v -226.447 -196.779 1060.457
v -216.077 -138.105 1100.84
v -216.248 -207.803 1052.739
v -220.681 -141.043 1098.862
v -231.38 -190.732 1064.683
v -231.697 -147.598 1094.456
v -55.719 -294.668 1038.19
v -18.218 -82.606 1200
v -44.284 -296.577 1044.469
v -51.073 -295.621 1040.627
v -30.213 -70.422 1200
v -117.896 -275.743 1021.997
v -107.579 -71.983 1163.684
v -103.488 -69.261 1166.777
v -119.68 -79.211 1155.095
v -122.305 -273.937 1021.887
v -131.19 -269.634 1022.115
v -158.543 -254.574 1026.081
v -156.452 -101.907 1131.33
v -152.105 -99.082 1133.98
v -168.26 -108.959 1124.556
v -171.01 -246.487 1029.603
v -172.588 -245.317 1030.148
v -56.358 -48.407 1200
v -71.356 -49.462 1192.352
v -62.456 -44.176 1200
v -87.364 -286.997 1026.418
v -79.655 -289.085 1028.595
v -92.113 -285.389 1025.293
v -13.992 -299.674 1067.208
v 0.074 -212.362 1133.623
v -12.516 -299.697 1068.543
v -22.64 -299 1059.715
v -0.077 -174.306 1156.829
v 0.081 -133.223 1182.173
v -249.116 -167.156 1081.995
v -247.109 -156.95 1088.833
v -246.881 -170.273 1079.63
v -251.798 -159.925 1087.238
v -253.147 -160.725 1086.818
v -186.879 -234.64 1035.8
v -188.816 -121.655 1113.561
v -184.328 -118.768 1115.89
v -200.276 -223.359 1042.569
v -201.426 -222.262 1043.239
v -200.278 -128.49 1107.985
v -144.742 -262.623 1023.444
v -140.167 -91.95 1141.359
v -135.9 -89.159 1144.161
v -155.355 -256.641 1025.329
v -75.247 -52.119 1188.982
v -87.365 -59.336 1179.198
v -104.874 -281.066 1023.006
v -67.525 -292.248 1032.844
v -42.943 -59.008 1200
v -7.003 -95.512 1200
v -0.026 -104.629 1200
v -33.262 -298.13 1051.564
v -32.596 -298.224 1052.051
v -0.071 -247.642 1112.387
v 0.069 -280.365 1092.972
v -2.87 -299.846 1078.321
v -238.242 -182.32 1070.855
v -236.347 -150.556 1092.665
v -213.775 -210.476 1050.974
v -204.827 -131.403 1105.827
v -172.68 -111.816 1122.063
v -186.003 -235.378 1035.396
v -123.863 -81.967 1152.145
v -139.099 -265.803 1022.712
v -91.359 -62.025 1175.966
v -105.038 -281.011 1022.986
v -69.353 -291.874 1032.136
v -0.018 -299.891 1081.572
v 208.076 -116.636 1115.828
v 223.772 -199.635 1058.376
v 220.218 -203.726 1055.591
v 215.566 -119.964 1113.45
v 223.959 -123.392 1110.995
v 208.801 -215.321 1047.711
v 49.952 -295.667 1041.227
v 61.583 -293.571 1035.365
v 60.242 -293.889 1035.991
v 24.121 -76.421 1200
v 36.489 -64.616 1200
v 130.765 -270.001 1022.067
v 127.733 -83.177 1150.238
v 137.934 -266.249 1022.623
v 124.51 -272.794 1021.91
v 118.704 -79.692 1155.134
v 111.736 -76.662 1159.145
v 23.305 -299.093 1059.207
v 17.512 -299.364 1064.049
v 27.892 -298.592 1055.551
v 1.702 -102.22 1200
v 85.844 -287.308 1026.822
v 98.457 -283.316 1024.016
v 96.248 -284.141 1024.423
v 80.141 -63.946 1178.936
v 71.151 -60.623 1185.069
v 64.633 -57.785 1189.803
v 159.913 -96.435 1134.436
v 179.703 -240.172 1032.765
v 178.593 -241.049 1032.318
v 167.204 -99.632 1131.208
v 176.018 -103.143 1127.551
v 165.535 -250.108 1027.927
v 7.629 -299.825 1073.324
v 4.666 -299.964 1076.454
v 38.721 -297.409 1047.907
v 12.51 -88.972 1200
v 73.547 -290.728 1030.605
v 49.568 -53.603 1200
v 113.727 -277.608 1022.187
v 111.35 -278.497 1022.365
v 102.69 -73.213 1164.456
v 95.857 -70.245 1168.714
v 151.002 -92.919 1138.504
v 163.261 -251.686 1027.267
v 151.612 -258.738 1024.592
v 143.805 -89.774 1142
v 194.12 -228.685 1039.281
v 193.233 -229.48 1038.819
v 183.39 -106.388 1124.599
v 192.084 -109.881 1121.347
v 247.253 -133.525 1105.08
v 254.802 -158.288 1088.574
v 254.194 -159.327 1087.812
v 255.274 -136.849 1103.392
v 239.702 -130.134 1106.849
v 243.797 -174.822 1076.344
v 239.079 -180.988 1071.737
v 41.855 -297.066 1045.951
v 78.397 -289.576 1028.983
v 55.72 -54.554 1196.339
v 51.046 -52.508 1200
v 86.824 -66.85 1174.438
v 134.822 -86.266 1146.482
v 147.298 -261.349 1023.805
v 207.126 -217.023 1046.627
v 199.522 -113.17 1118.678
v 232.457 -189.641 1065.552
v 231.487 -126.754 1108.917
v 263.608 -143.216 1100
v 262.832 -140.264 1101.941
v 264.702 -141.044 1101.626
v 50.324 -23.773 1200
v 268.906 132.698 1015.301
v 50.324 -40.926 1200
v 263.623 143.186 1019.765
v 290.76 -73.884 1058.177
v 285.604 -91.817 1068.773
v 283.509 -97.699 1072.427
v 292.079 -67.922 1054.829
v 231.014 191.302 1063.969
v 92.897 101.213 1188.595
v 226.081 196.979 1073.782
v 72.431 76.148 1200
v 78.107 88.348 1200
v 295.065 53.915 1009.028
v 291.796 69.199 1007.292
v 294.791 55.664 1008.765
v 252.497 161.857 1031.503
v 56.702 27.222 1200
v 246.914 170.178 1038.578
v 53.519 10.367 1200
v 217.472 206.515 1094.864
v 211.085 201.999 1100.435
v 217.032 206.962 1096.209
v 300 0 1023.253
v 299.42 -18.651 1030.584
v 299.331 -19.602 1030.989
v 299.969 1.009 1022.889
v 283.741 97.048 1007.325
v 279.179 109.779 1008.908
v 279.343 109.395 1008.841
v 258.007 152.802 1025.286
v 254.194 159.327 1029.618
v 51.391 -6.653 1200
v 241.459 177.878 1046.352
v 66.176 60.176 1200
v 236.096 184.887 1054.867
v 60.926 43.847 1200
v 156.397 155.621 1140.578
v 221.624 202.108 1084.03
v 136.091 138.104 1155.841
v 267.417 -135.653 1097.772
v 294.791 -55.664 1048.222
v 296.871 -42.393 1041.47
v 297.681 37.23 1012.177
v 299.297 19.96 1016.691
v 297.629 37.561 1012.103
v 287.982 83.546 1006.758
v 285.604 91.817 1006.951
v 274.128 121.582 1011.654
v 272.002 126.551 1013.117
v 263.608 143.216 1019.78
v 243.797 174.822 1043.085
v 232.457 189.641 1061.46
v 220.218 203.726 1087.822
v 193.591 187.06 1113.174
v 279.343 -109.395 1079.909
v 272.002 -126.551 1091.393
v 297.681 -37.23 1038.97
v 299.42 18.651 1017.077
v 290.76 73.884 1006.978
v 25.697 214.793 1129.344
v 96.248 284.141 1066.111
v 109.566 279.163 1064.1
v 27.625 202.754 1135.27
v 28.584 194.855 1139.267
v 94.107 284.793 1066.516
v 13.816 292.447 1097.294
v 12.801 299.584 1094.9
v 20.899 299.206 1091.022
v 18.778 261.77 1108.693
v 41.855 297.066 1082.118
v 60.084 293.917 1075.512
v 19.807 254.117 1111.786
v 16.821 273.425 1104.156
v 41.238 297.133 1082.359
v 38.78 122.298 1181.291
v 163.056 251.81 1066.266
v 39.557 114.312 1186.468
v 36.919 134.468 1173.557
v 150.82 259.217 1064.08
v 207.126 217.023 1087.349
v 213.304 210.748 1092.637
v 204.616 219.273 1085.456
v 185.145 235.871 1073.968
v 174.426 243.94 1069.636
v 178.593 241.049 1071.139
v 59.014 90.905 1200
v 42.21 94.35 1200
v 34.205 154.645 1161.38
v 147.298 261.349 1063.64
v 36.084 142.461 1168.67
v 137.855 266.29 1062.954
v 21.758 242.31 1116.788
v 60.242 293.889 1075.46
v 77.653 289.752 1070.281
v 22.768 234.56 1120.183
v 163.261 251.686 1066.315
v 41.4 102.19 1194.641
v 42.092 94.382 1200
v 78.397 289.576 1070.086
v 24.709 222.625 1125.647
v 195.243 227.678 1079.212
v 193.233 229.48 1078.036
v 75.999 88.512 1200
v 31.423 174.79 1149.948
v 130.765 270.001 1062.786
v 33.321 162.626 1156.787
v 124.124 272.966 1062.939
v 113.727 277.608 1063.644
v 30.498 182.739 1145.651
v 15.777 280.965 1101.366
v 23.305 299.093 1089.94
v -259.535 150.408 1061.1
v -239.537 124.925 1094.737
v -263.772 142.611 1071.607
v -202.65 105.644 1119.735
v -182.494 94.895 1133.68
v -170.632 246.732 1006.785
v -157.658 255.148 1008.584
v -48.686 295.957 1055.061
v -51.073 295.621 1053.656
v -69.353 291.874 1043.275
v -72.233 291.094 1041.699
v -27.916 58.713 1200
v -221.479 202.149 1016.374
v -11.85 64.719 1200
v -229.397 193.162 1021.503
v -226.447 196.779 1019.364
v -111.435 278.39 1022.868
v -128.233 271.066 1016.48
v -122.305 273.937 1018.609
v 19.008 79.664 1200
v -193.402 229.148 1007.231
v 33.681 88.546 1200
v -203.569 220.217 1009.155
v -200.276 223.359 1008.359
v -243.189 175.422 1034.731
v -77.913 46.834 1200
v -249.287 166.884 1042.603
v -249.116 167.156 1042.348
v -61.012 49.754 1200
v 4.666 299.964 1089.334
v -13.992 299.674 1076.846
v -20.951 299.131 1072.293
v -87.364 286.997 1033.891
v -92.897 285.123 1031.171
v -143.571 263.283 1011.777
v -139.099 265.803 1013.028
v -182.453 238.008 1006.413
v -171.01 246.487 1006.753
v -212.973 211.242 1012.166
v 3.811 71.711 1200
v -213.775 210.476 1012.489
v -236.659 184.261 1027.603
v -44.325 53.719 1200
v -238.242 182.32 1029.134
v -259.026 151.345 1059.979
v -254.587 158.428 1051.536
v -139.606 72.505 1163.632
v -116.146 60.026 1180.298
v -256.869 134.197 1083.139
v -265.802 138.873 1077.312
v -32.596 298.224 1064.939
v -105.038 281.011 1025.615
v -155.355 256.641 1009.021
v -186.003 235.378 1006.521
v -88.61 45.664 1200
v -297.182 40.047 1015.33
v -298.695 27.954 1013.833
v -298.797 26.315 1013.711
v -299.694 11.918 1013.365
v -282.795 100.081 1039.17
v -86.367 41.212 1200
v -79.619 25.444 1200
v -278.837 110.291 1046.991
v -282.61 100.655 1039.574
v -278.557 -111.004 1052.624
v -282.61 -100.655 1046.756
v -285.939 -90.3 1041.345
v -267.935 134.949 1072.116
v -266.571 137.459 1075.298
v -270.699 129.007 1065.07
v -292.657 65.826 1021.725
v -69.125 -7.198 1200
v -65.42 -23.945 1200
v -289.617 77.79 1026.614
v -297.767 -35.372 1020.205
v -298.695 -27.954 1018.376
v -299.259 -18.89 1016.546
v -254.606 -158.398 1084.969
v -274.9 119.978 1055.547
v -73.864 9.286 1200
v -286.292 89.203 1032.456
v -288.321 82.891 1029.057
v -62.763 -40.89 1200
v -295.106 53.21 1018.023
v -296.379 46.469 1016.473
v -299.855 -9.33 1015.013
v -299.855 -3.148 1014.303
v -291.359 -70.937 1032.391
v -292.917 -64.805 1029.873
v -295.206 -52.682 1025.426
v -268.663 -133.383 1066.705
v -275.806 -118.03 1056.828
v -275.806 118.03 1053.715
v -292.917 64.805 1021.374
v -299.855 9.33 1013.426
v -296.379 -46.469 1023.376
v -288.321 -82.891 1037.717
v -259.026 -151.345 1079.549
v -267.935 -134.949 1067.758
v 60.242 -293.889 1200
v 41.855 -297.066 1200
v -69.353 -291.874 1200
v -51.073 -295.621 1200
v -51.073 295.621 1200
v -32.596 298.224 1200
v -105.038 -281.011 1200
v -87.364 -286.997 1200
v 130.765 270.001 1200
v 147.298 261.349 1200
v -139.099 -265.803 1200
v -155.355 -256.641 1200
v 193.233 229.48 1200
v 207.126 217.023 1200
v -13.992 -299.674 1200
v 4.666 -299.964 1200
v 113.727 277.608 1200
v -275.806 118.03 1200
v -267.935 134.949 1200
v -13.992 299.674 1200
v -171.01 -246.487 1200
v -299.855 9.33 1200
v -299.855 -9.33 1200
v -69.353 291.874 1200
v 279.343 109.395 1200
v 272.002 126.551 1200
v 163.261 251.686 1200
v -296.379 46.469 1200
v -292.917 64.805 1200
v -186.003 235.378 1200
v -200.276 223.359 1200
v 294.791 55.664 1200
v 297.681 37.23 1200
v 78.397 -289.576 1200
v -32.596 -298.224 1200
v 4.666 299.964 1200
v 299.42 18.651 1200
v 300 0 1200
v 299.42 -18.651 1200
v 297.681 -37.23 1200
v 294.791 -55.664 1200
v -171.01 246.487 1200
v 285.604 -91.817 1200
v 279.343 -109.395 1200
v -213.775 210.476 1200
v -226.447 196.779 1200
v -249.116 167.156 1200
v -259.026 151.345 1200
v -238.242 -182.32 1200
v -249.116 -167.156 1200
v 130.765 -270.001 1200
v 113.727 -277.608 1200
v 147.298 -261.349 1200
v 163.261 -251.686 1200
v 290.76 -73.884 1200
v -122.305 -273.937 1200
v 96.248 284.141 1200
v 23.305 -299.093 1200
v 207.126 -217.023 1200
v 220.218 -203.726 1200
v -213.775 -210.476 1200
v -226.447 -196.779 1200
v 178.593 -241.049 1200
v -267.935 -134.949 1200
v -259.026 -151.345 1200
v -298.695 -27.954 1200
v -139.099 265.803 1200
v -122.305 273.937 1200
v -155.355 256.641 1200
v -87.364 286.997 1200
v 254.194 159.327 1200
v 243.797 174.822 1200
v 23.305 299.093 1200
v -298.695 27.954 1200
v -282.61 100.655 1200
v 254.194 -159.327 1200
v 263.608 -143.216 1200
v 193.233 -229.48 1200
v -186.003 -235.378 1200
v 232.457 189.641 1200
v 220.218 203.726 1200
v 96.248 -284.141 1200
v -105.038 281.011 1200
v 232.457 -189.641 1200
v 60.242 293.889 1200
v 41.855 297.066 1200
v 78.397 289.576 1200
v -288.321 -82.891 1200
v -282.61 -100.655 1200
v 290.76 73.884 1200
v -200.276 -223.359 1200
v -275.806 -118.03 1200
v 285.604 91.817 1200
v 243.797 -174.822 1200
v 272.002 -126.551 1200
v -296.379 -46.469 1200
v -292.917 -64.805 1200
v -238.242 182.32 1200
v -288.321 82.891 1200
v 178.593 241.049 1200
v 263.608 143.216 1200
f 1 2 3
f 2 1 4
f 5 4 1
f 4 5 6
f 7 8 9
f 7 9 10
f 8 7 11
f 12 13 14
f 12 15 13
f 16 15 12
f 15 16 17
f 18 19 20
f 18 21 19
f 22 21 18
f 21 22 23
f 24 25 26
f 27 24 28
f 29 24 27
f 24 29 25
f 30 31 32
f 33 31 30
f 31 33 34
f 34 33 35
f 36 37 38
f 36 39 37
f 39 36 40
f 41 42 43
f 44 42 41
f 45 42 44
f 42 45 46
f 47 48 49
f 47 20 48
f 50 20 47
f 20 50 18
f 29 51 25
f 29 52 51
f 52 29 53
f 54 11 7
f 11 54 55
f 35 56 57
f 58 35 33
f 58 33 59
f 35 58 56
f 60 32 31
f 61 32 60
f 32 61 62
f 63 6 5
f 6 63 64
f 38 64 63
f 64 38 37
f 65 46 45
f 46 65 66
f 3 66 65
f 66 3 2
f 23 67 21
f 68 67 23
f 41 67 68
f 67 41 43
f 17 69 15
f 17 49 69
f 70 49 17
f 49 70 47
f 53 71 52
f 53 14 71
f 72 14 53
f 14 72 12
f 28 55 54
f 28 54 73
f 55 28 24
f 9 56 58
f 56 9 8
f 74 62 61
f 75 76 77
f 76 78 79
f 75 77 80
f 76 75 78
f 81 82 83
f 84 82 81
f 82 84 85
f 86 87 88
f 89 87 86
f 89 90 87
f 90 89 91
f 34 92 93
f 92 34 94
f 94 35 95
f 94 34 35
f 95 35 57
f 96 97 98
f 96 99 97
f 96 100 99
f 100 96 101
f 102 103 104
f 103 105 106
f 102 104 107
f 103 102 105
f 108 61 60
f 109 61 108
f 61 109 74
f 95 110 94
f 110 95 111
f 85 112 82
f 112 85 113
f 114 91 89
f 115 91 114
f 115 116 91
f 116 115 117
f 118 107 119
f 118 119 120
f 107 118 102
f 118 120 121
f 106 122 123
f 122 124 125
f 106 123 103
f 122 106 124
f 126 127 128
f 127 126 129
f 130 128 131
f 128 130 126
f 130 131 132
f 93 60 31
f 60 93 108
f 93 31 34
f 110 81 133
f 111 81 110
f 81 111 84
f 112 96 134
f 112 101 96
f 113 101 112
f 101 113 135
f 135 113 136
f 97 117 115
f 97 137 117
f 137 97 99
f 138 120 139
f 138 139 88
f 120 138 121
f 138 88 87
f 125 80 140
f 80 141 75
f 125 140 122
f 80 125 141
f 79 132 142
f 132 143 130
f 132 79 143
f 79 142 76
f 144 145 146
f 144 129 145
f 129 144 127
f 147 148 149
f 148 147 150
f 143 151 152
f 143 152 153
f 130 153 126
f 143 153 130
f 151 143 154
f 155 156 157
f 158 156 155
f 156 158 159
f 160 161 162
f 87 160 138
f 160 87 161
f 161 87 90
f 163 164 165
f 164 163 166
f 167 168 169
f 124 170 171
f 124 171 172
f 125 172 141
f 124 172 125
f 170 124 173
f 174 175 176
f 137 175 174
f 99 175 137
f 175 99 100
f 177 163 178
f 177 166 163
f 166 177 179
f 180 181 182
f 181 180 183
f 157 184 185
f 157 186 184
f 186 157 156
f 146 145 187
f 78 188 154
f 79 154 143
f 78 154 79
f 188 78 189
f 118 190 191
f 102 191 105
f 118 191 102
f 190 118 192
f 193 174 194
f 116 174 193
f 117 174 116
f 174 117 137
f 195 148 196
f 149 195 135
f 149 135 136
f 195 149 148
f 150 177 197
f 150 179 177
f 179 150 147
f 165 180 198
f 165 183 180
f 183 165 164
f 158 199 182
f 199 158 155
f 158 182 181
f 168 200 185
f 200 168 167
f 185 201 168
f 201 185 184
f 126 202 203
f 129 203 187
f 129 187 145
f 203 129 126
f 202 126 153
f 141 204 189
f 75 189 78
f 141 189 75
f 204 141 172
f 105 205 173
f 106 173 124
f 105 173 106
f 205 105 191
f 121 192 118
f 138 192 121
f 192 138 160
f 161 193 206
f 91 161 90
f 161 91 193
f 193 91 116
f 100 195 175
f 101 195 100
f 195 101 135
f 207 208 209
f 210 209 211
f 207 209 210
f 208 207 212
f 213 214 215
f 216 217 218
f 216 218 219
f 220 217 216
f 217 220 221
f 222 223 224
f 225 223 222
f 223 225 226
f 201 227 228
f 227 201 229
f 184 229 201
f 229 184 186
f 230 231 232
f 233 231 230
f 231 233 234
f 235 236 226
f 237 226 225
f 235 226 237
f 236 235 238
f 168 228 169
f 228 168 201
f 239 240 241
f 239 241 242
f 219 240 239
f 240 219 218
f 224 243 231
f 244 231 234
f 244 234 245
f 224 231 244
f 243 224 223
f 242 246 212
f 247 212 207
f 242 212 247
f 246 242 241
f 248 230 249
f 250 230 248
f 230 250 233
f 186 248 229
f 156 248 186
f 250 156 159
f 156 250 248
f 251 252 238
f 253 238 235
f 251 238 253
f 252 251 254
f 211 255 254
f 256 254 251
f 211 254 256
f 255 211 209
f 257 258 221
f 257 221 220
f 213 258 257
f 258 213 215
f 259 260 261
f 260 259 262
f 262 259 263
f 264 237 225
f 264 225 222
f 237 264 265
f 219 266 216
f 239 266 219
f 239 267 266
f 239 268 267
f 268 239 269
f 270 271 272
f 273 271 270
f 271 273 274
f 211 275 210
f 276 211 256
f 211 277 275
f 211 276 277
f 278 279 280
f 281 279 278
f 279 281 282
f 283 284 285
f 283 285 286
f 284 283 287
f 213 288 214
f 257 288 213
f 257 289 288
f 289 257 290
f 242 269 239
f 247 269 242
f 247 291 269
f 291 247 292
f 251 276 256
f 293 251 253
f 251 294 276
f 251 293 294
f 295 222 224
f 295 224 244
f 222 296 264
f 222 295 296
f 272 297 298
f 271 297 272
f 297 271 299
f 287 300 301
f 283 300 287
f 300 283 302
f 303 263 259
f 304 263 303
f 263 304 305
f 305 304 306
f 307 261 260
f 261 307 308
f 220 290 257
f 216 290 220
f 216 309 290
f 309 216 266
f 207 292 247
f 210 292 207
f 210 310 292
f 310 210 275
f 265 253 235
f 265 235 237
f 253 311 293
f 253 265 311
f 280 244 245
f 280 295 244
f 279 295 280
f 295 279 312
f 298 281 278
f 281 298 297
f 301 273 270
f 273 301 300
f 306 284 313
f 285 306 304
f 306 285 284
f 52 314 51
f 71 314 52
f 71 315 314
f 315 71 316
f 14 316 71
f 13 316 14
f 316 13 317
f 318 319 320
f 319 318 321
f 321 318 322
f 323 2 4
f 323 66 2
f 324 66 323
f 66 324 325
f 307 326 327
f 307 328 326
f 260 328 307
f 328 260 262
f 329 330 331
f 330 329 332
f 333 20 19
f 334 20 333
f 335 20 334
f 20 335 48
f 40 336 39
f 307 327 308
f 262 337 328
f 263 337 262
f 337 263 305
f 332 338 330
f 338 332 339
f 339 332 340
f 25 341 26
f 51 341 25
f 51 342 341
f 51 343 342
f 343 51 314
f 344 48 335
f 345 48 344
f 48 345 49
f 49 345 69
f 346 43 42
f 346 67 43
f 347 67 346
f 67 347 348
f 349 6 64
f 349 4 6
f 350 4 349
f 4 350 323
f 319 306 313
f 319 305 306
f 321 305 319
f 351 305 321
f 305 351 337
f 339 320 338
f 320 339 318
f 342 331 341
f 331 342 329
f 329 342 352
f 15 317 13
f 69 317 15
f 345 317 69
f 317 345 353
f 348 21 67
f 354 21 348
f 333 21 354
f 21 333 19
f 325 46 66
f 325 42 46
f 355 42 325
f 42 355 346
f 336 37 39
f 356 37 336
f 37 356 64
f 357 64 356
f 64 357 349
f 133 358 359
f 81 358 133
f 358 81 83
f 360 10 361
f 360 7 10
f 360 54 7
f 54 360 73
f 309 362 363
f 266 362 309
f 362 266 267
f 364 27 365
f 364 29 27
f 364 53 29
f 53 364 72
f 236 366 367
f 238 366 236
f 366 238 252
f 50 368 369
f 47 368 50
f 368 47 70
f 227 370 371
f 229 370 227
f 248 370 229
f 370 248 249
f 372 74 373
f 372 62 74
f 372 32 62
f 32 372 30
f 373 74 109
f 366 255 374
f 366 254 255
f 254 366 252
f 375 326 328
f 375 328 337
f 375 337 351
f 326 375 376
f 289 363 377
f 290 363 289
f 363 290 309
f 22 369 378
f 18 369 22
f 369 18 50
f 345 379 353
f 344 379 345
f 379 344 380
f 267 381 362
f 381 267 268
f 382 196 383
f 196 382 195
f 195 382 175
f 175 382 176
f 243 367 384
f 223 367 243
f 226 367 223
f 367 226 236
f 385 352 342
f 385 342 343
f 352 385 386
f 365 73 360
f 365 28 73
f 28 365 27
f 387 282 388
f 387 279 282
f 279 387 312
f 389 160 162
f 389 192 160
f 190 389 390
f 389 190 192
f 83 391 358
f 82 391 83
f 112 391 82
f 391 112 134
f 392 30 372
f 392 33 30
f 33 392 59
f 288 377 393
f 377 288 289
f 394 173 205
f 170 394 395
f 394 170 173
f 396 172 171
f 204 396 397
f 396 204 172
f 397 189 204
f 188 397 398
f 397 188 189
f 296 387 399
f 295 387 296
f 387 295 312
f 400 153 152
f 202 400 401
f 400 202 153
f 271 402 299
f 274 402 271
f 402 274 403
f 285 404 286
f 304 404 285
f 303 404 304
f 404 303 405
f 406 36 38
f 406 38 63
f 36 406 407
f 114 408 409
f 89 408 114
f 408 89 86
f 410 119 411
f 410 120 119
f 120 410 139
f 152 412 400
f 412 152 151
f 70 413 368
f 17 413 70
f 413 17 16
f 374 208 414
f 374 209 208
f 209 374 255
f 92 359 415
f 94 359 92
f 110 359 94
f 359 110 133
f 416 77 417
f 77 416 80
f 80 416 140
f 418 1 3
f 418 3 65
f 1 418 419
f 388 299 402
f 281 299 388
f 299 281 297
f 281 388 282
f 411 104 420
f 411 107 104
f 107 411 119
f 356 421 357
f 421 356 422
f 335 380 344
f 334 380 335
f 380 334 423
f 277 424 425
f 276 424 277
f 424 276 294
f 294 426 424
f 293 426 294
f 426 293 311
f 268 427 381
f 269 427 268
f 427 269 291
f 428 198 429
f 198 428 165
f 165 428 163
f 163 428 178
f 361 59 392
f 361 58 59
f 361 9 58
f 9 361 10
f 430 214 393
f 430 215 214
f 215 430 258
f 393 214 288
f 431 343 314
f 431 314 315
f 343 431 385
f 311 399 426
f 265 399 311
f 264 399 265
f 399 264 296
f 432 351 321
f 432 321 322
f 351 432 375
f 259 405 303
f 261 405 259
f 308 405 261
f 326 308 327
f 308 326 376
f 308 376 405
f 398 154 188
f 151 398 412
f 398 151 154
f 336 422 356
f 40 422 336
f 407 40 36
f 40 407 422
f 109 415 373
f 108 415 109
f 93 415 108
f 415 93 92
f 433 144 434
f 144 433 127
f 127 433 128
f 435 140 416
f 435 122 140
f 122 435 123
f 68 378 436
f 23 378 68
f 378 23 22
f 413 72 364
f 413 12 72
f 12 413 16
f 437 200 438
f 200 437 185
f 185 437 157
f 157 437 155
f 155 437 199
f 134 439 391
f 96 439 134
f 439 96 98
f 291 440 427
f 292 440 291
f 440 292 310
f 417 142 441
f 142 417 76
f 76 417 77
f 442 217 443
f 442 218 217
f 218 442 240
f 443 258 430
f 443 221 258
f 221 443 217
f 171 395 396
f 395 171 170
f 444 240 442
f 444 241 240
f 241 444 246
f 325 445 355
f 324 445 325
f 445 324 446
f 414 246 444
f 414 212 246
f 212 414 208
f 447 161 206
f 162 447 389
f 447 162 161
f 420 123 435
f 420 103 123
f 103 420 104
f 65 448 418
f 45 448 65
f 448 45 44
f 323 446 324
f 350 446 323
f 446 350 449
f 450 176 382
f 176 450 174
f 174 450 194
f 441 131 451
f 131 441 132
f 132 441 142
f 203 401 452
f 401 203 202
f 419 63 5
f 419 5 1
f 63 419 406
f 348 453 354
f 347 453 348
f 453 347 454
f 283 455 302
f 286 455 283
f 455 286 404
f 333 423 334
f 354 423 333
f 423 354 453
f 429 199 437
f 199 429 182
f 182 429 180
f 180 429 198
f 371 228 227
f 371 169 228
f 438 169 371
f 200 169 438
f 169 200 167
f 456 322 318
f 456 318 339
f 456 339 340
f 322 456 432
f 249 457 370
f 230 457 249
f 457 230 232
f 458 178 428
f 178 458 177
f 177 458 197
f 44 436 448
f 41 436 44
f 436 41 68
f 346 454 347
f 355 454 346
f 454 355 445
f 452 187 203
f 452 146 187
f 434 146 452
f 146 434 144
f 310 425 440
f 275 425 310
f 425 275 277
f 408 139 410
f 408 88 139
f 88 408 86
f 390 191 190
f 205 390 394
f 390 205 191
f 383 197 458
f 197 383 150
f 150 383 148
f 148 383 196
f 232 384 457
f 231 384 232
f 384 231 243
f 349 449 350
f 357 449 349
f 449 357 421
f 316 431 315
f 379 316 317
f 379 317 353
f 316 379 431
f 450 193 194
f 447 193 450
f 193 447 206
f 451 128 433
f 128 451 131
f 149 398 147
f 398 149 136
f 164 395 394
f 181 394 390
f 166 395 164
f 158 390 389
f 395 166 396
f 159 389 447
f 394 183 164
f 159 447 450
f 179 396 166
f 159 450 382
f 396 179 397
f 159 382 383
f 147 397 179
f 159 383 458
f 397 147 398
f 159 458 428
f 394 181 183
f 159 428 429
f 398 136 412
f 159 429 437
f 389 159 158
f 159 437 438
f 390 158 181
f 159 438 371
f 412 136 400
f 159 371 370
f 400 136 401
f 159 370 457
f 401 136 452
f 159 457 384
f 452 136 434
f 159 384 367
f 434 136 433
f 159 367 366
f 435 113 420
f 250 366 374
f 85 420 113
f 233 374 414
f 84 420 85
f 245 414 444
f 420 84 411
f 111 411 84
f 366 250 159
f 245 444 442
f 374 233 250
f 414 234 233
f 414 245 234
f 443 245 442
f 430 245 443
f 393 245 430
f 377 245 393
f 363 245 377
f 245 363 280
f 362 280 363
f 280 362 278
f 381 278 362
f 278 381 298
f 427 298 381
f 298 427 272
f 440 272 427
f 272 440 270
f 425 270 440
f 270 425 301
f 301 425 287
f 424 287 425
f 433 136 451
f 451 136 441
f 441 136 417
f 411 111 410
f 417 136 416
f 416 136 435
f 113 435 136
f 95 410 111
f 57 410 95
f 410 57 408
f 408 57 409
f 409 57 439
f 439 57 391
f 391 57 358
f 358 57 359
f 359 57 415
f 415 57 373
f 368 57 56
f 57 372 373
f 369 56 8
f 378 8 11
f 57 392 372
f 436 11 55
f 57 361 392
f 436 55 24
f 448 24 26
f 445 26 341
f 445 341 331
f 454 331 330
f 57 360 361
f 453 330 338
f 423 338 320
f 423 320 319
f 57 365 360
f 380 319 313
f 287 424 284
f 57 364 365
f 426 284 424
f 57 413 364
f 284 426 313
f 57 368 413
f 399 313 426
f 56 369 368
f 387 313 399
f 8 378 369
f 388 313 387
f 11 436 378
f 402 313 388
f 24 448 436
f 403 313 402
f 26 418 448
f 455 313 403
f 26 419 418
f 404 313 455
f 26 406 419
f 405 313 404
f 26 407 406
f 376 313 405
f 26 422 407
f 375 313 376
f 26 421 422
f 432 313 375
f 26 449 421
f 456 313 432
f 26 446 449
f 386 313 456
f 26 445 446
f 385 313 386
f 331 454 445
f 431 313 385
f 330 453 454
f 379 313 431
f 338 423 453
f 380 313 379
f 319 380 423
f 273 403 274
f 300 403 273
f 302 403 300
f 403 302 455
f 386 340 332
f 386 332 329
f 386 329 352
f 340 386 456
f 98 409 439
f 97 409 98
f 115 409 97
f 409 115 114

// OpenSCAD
left = 0;
right = 1;
X = 0;
Y = 1;
Z = 2;

// This the calibrated A anchor position
// If doesn't account for the fact that the
// action points are 2 in the A-direction,
// and they are offset from the nozzle
A_calib = [0, -1604, -114];

// This is the cartesian position of the two
// action points, relative to the nozzle
A_offset = [[-220, -135, 110],
            [ 220, -135, 110]];

// This is the carthesian position of the anchor
// action points, relative to the origin
A = [A_calib + A_offset[left],
     A_calib + A_offset[right]];

B_calib = [1312, 1271, -162];

B_offset = [[ 220, -135, 110],
            [   0,  260, 110]];

B = [B_calib + B_offset[left],
     B_calib + B_offset[right]];

C_calib = [-1440, 741, -161];

C_offset = [[   0,  260, 110],
            [-220, -135, 110]];

C = [C_calib + C_offset[left],
     C_calib + C_offset[right]];


//echo(circle_points2d(100, 3));
function circle_points2d(r, steps) =
  [for (a=[0:360/steps:360-360/(steps+1)])
    r*[cos(a), sin(a)]];

//linear_extrude(height=4)
//  polygon(points = circle_points2d(100, 3));
function circle_points(r, steps, v) =
  [for (a=[0:360/steps:360-360/(steps+1)])
    r*[cos(a), sin(a), 0] + v];

//echo(roundabout_cone(3));
function roundabout_cone(size) =
  [for (elem=[0:1:size-1])
     [elem, (elem+1)%size, size]];

//echo(roundabout_plane(4));
function roundabout_plane(size) =
  [for (elem=[1:1:size-2])
    [0, elem + 1, elem]];

module line_vol(path, path_size, anch){
  polyhedron(points = concat(path, [anch]),
             faces = concat(roundabout_cone(path_size), roundabout_plane(path_size)));
}

layer_height = 1;
r = 600/2;
edges = 101;
for (layer = 1200){
  %linear_extrude(height=layer_height*layer)
    polygon(circle_points2d(r, edges));
  color("lime"){
    intersection(){
      linear_extrude(height=layer_height*layer)
        polygon(circle_points2d(r, edges));
      #union(){
        // A lines
        line_vol(circle_points(r, edges,
                    A_offset[left] + [0, 0, layer*layer_height]),
          edges, A[left]);
        line_vol(circle_points(r, edges,
                    A_offset[right] + [0, 0, layer*layer_height]),
          edges, A[right]);
        // B lines
        line_vol(circle_points(r, edges,
                    B_offset[left] + [0, 0, layer*layer_height]),
          edges, B[left]);
        line_vol(circle_points(r, edges,
                    B_offset[right] + [0, 0, layer*layer_height]),
          edges, B[right]);
        // C lines
        line_vol(circle_points(r, edges,
                    C_offset[left] + [0, 0, layer*layer_height]),
          edges, C[left]);
        line_vol(circle_points(r, edges,
                    C_offset[right] + [0, 0, layer*layer_height]),
          edges, C[right]);
      }
    }
  }
}
